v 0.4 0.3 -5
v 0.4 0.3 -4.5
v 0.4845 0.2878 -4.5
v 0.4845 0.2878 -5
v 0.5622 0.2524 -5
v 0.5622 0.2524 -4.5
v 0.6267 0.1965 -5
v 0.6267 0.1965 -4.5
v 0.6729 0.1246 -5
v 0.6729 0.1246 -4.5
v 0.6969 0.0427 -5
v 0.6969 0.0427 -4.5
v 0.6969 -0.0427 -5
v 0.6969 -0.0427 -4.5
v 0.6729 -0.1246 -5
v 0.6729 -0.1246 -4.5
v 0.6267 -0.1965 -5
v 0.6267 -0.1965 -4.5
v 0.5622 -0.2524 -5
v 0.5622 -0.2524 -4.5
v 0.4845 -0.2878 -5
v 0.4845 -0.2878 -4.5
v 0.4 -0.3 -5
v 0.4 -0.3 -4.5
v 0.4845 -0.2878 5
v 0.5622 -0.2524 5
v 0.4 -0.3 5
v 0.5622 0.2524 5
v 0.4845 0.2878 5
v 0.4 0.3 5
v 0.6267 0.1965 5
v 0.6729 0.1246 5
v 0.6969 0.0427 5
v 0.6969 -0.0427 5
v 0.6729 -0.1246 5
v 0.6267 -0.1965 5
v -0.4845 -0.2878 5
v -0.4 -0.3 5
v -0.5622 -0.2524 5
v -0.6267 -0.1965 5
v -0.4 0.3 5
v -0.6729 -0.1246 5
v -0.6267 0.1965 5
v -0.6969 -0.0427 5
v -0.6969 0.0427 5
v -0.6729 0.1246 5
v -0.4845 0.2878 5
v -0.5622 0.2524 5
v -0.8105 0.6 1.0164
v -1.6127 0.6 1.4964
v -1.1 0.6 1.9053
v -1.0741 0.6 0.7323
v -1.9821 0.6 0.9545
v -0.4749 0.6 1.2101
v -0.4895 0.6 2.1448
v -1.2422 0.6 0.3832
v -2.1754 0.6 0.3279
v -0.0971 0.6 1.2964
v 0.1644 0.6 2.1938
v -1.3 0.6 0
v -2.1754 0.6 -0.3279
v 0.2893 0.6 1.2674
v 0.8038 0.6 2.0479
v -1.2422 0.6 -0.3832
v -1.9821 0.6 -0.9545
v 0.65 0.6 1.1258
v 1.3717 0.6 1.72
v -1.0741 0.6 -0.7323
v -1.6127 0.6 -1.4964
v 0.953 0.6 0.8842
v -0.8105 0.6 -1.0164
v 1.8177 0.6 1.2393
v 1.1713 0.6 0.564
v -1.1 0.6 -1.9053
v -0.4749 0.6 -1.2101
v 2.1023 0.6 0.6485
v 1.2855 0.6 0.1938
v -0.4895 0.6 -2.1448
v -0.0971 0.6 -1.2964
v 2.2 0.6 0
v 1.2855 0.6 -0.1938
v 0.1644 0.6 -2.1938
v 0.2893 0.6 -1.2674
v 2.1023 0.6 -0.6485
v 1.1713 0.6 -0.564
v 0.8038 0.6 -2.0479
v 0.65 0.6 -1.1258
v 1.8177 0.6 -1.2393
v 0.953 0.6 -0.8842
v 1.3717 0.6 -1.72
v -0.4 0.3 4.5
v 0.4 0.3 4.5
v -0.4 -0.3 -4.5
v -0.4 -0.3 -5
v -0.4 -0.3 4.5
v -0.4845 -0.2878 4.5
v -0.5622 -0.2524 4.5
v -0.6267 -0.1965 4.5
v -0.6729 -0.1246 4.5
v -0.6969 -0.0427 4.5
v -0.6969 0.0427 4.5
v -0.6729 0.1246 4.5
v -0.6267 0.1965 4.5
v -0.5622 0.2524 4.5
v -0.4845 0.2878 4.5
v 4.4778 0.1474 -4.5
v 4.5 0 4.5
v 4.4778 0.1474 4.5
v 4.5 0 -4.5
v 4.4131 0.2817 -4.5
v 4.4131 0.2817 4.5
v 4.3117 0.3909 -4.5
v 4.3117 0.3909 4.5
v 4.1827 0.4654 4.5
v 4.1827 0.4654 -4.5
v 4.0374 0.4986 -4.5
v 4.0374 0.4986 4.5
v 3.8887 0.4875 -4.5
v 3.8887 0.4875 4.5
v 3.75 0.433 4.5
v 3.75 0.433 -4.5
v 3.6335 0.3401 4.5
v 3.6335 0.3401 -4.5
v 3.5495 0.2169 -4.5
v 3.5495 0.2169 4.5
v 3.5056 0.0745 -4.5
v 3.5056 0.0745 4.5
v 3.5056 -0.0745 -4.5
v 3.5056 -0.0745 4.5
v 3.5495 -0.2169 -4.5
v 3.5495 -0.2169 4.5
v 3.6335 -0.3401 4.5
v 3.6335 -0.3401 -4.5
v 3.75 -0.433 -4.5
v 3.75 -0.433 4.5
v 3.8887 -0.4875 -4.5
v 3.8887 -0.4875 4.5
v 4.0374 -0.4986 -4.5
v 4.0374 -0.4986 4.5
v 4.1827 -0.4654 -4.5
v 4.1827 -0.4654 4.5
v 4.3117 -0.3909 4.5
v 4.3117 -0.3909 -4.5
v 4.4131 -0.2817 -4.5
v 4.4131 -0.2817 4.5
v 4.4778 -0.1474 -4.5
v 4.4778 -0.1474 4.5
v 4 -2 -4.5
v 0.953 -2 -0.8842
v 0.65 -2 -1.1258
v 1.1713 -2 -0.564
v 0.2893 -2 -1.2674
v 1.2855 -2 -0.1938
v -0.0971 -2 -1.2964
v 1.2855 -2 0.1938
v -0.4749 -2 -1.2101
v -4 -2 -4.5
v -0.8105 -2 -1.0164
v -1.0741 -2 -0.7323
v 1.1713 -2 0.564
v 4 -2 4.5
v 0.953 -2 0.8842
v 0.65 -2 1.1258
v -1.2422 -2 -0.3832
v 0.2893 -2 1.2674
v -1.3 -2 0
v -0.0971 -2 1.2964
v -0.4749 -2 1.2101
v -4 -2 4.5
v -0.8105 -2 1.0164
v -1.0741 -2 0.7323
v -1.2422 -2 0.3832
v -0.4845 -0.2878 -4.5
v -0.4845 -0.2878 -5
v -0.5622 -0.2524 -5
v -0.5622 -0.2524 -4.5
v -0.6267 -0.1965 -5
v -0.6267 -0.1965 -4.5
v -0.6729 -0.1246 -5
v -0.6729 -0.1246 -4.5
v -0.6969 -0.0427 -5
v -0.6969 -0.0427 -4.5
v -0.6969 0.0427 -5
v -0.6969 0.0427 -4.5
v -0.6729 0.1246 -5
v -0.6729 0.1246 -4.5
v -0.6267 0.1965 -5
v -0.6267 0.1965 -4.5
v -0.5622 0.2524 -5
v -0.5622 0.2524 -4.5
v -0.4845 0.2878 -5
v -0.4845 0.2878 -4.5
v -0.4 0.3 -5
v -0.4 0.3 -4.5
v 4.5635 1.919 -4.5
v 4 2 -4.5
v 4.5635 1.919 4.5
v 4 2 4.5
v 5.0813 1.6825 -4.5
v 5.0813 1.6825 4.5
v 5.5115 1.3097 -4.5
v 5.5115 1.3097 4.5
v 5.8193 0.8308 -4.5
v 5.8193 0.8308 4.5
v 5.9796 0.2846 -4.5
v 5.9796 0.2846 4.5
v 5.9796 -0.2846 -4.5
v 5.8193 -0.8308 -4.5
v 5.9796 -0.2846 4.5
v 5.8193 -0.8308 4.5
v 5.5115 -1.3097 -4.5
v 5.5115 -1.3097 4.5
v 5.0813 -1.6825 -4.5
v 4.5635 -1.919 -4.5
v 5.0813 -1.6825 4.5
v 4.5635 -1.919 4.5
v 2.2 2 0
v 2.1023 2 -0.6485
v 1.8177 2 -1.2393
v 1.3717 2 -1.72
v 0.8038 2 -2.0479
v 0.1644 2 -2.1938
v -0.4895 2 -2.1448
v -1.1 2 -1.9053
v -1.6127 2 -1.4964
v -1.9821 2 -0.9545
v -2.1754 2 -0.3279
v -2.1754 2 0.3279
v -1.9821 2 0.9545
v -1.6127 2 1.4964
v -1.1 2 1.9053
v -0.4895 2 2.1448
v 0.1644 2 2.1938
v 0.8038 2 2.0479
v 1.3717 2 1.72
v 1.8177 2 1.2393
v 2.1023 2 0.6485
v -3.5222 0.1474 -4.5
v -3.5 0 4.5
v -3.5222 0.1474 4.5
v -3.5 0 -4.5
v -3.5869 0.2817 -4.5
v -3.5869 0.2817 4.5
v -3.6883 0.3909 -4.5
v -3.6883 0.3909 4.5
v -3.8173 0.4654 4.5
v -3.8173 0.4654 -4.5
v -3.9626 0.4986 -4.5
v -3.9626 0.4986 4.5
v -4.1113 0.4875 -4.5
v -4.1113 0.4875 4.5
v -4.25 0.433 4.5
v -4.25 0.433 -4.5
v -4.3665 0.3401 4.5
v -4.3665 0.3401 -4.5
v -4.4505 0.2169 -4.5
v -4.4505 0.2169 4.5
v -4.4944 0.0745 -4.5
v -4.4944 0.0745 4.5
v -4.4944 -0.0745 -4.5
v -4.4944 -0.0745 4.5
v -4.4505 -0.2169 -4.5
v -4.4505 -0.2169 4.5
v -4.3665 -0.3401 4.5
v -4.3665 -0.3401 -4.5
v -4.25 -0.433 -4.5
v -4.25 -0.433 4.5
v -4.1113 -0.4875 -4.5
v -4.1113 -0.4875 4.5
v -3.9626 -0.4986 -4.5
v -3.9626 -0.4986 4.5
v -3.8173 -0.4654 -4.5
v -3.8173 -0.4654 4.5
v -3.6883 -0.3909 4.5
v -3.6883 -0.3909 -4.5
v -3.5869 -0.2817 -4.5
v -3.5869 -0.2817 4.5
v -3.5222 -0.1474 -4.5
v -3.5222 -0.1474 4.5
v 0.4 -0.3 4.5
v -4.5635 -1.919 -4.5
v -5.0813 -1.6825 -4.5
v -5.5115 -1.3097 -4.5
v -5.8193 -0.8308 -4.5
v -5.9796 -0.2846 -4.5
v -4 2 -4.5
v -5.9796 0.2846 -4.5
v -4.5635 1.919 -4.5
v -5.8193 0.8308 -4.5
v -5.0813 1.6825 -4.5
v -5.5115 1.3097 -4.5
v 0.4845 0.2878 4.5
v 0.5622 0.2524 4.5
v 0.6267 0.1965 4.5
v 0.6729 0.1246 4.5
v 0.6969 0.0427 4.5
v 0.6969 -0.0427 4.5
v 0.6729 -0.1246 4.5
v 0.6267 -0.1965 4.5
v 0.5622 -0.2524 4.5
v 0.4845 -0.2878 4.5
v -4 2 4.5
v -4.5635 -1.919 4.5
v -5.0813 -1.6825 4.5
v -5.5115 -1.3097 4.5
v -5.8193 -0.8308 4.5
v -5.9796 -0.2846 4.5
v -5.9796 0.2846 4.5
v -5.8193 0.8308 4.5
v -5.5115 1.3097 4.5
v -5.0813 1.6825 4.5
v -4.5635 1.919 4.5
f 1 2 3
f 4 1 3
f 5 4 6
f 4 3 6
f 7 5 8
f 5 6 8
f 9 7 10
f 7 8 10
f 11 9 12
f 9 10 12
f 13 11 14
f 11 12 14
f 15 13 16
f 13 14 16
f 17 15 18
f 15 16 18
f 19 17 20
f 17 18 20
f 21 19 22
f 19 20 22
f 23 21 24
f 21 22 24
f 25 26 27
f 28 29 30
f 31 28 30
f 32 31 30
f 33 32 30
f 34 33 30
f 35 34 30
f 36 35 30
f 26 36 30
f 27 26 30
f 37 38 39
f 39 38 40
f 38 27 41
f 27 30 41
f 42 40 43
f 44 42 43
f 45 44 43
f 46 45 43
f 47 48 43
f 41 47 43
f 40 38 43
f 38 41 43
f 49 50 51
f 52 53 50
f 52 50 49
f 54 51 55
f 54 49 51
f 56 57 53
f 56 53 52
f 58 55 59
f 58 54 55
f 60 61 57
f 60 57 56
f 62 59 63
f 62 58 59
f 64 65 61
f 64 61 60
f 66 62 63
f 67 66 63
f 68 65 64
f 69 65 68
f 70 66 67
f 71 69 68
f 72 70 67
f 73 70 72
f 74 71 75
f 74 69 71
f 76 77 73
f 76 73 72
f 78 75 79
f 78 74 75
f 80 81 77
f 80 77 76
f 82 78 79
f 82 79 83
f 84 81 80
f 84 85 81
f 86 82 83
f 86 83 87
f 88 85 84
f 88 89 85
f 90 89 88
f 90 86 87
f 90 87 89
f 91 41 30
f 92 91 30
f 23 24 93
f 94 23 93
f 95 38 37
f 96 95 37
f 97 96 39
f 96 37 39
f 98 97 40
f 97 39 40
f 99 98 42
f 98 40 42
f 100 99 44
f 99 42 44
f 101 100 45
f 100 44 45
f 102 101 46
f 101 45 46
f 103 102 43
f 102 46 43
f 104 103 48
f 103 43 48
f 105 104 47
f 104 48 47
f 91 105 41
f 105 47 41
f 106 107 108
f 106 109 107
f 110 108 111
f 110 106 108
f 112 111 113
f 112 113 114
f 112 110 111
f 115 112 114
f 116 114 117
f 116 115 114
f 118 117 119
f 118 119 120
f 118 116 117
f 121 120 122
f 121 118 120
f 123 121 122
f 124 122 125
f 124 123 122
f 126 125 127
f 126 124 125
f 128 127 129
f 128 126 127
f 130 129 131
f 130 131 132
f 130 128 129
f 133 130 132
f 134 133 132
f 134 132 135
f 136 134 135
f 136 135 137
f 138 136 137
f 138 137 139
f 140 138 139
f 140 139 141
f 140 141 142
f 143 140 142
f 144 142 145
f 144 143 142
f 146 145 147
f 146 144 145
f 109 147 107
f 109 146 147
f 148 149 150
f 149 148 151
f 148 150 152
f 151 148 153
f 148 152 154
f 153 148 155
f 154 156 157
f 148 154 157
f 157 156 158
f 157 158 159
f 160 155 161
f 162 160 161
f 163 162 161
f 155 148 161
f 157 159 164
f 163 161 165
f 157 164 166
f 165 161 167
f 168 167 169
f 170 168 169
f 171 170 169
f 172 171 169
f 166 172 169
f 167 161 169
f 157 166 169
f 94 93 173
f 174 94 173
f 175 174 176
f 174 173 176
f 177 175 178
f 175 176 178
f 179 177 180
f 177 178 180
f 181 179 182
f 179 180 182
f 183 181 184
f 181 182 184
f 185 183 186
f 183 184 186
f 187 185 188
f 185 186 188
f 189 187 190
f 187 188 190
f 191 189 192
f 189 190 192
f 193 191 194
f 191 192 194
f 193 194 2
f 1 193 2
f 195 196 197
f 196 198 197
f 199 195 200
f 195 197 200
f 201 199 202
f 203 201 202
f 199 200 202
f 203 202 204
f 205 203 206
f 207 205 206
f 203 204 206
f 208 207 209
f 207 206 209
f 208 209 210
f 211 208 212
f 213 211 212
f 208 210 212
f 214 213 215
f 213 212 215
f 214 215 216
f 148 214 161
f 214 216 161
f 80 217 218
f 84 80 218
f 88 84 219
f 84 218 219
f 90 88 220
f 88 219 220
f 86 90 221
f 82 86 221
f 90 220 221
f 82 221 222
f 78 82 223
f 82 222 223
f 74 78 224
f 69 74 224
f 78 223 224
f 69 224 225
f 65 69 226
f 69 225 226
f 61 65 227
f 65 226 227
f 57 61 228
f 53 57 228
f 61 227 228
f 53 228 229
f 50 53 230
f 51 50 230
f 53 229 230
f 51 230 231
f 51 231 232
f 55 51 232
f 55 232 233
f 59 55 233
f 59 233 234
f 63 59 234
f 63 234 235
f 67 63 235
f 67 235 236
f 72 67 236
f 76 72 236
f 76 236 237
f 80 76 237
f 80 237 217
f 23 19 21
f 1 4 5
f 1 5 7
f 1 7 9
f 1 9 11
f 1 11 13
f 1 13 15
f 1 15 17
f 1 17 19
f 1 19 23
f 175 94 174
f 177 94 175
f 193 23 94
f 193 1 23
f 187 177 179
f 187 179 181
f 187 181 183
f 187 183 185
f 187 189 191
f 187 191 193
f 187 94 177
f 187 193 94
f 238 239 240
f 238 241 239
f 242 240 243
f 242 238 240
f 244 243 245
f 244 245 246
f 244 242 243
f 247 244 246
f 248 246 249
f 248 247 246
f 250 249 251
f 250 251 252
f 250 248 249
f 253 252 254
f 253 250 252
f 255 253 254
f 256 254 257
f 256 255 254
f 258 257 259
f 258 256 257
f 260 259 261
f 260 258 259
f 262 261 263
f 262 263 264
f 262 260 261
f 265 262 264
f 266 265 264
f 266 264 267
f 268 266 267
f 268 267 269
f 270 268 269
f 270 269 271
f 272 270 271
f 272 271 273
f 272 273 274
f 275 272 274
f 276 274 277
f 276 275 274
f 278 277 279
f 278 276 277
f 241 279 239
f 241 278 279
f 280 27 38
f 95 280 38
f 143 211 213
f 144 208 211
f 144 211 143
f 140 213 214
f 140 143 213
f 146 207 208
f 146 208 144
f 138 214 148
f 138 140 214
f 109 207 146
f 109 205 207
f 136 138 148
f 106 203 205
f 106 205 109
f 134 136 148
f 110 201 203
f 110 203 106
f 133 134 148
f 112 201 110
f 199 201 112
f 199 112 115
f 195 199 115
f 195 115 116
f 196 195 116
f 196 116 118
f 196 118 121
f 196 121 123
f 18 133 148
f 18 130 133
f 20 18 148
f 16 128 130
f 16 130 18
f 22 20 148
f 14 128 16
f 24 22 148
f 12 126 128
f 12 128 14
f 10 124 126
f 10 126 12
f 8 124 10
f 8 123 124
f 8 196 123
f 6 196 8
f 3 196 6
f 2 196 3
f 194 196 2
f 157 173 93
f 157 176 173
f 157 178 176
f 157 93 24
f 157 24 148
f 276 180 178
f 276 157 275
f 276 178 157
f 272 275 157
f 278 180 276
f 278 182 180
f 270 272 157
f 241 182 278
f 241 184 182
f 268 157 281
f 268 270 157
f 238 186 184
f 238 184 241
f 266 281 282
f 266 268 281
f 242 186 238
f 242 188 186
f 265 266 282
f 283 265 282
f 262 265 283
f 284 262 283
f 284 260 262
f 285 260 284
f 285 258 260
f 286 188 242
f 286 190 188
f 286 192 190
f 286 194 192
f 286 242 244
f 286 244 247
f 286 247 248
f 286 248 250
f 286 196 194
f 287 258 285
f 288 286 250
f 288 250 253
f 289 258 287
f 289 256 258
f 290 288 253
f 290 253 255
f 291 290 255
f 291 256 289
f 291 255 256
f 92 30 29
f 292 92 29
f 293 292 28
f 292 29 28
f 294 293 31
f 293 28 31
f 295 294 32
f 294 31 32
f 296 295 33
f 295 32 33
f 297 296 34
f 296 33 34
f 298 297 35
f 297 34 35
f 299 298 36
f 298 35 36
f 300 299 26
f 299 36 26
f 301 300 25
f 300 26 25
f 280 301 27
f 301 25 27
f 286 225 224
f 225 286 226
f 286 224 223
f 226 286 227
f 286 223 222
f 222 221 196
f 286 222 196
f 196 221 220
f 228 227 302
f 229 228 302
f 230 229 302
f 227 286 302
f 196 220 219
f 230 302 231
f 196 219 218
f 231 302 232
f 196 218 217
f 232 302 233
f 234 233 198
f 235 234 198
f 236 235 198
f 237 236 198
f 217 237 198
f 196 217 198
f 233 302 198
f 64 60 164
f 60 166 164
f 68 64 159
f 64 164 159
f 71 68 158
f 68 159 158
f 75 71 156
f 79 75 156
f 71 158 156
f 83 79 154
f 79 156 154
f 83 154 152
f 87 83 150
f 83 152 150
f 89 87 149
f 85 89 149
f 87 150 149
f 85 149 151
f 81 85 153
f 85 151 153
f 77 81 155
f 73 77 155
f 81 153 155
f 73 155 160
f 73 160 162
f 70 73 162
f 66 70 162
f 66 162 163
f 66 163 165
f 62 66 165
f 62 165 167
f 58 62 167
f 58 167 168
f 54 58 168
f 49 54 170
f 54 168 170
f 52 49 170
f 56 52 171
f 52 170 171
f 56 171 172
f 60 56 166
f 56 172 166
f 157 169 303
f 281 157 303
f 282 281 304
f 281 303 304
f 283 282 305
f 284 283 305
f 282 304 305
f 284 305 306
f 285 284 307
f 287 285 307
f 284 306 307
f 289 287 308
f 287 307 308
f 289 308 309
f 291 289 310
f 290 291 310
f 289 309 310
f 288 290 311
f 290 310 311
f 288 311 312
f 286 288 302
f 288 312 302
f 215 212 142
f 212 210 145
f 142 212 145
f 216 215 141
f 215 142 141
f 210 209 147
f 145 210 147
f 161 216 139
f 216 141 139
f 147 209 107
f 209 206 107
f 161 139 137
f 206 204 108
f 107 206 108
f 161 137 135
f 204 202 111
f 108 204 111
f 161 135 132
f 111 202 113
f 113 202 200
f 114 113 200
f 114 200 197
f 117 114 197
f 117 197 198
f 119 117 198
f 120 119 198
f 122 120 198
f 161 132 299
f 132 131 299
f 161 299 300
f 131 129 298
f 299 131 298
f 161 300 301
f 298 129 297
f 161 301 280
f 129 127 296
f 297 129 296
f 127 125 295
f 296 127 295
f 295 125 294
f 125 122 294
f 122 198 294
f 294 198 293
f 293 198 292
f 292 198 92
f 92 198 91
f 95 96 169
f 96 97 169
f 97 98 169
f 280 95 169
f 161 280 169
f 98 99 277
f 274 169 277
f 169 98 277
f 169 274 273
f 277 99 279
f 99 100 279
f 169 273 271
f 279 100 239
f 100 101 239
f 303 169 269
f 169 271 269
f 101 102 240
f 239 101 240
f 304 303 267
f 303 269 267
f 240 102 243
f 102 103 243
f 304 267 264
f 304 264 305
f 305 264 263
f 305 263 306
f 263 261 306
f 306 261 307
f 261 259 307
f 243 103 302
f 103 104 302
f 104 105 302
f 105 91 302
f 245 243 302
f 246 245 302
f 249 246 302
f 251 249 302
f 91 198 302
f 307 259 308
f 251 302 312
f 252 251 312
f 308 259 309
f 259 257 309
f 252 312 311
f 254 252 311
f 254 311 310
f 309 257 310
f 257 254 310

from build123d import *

# Parameters (mm, degrees)
SKETCH1_R                                   = 0.5
BOSS_EXTRUDE1_DEPTH                         = 4.5
BOSS_EXTRUDE2_DEPTH                         = 5
CBORE_FOR_M2_CHEESE_HEAD_SCREW1_D           = 2.6
CBORE_FOR_M2_CHEESE_HEAD_SCREW1_CBORE_D     = 4.4
CBORE_FOR_M2_CHEESE_HEAD_SCREW1_CBORE_DEPTH = 1.4


with BuildPart() as part:
    # Sketch1 → Boss-Extrude1 (new, symmetric)
    with BuildSketch(Plane.XY):
        with BuildLine():
            Line((-4, 2), (4, 2))
            ThreePointArc((4, 2), (6, 0), (4, -2))
            Line((4, -2), (-4, -2))
            ThreePointArc((-4, -2), (-6, 0), (-4, 2))
        make_face()
        with Locations((-4, 0)):
            Circle(SKETCH1_R, mode=Mode.SUBTRACT)
        with Locations((4, 0)):
            Circle(SKETCH1_R, mode=Mode.SUBTRACT)
        with BuildLine():
            Line((-0.4, 0.3), (0.4, 0.3))
            ThreePointArc((0.4, 0.3), (0.7, 0), (0.4, -0.3))
            Line((0.4, -0.3), (-0.4, -0.3))
            ThreePointArc((-0.4, -0.3), (-0.7, 0), (-0.4, 0.3))
        make_face(mode=Mode.SUBTRACT)
    extrude(amount=BOSS_EXTRUDE1_DEPTH, both=True)

    # Sketch1<2> → Boss-Extrude2 (add, symmetric)
    with BuildSketch(Plane.XY):
        with BuildLine():
            Line((-0.4, 0.3), (0.4, 0.3))
            ThreePointArc((0.4, 0.3), (0.7, 0), (0.4, -0.3))
            Line((0.4, -0.3), (-0.4, -0.3))
            ThreePointArc((-0.4, -0.3), (-0.7, 0), (-0.4, 0.3))
        make_face()
    extrude(amount=BOSS_EXTRUDE2_DEPTH, both=True)

    # CBORE for M2 Cheese Head Screw1 (through all)
    with Locations(Plane(origin=(0, 2, 0), x_dir=(1, 0, 0), z_dir=(0, 1, 0))):
        with Locations((0, 0)):
            CounterBoreHole(CBORE_FOR_M2_CHEESE_HEAD_SCREW1_D / 2, CBORE_FOR_M2_CHEESE_HEAD_SCREW1_CBORE_D / 2, CBORE_FOR_M2_CHEESE_HEAD_SCREW1_CBORE_DEPTH)


solid = part.part
